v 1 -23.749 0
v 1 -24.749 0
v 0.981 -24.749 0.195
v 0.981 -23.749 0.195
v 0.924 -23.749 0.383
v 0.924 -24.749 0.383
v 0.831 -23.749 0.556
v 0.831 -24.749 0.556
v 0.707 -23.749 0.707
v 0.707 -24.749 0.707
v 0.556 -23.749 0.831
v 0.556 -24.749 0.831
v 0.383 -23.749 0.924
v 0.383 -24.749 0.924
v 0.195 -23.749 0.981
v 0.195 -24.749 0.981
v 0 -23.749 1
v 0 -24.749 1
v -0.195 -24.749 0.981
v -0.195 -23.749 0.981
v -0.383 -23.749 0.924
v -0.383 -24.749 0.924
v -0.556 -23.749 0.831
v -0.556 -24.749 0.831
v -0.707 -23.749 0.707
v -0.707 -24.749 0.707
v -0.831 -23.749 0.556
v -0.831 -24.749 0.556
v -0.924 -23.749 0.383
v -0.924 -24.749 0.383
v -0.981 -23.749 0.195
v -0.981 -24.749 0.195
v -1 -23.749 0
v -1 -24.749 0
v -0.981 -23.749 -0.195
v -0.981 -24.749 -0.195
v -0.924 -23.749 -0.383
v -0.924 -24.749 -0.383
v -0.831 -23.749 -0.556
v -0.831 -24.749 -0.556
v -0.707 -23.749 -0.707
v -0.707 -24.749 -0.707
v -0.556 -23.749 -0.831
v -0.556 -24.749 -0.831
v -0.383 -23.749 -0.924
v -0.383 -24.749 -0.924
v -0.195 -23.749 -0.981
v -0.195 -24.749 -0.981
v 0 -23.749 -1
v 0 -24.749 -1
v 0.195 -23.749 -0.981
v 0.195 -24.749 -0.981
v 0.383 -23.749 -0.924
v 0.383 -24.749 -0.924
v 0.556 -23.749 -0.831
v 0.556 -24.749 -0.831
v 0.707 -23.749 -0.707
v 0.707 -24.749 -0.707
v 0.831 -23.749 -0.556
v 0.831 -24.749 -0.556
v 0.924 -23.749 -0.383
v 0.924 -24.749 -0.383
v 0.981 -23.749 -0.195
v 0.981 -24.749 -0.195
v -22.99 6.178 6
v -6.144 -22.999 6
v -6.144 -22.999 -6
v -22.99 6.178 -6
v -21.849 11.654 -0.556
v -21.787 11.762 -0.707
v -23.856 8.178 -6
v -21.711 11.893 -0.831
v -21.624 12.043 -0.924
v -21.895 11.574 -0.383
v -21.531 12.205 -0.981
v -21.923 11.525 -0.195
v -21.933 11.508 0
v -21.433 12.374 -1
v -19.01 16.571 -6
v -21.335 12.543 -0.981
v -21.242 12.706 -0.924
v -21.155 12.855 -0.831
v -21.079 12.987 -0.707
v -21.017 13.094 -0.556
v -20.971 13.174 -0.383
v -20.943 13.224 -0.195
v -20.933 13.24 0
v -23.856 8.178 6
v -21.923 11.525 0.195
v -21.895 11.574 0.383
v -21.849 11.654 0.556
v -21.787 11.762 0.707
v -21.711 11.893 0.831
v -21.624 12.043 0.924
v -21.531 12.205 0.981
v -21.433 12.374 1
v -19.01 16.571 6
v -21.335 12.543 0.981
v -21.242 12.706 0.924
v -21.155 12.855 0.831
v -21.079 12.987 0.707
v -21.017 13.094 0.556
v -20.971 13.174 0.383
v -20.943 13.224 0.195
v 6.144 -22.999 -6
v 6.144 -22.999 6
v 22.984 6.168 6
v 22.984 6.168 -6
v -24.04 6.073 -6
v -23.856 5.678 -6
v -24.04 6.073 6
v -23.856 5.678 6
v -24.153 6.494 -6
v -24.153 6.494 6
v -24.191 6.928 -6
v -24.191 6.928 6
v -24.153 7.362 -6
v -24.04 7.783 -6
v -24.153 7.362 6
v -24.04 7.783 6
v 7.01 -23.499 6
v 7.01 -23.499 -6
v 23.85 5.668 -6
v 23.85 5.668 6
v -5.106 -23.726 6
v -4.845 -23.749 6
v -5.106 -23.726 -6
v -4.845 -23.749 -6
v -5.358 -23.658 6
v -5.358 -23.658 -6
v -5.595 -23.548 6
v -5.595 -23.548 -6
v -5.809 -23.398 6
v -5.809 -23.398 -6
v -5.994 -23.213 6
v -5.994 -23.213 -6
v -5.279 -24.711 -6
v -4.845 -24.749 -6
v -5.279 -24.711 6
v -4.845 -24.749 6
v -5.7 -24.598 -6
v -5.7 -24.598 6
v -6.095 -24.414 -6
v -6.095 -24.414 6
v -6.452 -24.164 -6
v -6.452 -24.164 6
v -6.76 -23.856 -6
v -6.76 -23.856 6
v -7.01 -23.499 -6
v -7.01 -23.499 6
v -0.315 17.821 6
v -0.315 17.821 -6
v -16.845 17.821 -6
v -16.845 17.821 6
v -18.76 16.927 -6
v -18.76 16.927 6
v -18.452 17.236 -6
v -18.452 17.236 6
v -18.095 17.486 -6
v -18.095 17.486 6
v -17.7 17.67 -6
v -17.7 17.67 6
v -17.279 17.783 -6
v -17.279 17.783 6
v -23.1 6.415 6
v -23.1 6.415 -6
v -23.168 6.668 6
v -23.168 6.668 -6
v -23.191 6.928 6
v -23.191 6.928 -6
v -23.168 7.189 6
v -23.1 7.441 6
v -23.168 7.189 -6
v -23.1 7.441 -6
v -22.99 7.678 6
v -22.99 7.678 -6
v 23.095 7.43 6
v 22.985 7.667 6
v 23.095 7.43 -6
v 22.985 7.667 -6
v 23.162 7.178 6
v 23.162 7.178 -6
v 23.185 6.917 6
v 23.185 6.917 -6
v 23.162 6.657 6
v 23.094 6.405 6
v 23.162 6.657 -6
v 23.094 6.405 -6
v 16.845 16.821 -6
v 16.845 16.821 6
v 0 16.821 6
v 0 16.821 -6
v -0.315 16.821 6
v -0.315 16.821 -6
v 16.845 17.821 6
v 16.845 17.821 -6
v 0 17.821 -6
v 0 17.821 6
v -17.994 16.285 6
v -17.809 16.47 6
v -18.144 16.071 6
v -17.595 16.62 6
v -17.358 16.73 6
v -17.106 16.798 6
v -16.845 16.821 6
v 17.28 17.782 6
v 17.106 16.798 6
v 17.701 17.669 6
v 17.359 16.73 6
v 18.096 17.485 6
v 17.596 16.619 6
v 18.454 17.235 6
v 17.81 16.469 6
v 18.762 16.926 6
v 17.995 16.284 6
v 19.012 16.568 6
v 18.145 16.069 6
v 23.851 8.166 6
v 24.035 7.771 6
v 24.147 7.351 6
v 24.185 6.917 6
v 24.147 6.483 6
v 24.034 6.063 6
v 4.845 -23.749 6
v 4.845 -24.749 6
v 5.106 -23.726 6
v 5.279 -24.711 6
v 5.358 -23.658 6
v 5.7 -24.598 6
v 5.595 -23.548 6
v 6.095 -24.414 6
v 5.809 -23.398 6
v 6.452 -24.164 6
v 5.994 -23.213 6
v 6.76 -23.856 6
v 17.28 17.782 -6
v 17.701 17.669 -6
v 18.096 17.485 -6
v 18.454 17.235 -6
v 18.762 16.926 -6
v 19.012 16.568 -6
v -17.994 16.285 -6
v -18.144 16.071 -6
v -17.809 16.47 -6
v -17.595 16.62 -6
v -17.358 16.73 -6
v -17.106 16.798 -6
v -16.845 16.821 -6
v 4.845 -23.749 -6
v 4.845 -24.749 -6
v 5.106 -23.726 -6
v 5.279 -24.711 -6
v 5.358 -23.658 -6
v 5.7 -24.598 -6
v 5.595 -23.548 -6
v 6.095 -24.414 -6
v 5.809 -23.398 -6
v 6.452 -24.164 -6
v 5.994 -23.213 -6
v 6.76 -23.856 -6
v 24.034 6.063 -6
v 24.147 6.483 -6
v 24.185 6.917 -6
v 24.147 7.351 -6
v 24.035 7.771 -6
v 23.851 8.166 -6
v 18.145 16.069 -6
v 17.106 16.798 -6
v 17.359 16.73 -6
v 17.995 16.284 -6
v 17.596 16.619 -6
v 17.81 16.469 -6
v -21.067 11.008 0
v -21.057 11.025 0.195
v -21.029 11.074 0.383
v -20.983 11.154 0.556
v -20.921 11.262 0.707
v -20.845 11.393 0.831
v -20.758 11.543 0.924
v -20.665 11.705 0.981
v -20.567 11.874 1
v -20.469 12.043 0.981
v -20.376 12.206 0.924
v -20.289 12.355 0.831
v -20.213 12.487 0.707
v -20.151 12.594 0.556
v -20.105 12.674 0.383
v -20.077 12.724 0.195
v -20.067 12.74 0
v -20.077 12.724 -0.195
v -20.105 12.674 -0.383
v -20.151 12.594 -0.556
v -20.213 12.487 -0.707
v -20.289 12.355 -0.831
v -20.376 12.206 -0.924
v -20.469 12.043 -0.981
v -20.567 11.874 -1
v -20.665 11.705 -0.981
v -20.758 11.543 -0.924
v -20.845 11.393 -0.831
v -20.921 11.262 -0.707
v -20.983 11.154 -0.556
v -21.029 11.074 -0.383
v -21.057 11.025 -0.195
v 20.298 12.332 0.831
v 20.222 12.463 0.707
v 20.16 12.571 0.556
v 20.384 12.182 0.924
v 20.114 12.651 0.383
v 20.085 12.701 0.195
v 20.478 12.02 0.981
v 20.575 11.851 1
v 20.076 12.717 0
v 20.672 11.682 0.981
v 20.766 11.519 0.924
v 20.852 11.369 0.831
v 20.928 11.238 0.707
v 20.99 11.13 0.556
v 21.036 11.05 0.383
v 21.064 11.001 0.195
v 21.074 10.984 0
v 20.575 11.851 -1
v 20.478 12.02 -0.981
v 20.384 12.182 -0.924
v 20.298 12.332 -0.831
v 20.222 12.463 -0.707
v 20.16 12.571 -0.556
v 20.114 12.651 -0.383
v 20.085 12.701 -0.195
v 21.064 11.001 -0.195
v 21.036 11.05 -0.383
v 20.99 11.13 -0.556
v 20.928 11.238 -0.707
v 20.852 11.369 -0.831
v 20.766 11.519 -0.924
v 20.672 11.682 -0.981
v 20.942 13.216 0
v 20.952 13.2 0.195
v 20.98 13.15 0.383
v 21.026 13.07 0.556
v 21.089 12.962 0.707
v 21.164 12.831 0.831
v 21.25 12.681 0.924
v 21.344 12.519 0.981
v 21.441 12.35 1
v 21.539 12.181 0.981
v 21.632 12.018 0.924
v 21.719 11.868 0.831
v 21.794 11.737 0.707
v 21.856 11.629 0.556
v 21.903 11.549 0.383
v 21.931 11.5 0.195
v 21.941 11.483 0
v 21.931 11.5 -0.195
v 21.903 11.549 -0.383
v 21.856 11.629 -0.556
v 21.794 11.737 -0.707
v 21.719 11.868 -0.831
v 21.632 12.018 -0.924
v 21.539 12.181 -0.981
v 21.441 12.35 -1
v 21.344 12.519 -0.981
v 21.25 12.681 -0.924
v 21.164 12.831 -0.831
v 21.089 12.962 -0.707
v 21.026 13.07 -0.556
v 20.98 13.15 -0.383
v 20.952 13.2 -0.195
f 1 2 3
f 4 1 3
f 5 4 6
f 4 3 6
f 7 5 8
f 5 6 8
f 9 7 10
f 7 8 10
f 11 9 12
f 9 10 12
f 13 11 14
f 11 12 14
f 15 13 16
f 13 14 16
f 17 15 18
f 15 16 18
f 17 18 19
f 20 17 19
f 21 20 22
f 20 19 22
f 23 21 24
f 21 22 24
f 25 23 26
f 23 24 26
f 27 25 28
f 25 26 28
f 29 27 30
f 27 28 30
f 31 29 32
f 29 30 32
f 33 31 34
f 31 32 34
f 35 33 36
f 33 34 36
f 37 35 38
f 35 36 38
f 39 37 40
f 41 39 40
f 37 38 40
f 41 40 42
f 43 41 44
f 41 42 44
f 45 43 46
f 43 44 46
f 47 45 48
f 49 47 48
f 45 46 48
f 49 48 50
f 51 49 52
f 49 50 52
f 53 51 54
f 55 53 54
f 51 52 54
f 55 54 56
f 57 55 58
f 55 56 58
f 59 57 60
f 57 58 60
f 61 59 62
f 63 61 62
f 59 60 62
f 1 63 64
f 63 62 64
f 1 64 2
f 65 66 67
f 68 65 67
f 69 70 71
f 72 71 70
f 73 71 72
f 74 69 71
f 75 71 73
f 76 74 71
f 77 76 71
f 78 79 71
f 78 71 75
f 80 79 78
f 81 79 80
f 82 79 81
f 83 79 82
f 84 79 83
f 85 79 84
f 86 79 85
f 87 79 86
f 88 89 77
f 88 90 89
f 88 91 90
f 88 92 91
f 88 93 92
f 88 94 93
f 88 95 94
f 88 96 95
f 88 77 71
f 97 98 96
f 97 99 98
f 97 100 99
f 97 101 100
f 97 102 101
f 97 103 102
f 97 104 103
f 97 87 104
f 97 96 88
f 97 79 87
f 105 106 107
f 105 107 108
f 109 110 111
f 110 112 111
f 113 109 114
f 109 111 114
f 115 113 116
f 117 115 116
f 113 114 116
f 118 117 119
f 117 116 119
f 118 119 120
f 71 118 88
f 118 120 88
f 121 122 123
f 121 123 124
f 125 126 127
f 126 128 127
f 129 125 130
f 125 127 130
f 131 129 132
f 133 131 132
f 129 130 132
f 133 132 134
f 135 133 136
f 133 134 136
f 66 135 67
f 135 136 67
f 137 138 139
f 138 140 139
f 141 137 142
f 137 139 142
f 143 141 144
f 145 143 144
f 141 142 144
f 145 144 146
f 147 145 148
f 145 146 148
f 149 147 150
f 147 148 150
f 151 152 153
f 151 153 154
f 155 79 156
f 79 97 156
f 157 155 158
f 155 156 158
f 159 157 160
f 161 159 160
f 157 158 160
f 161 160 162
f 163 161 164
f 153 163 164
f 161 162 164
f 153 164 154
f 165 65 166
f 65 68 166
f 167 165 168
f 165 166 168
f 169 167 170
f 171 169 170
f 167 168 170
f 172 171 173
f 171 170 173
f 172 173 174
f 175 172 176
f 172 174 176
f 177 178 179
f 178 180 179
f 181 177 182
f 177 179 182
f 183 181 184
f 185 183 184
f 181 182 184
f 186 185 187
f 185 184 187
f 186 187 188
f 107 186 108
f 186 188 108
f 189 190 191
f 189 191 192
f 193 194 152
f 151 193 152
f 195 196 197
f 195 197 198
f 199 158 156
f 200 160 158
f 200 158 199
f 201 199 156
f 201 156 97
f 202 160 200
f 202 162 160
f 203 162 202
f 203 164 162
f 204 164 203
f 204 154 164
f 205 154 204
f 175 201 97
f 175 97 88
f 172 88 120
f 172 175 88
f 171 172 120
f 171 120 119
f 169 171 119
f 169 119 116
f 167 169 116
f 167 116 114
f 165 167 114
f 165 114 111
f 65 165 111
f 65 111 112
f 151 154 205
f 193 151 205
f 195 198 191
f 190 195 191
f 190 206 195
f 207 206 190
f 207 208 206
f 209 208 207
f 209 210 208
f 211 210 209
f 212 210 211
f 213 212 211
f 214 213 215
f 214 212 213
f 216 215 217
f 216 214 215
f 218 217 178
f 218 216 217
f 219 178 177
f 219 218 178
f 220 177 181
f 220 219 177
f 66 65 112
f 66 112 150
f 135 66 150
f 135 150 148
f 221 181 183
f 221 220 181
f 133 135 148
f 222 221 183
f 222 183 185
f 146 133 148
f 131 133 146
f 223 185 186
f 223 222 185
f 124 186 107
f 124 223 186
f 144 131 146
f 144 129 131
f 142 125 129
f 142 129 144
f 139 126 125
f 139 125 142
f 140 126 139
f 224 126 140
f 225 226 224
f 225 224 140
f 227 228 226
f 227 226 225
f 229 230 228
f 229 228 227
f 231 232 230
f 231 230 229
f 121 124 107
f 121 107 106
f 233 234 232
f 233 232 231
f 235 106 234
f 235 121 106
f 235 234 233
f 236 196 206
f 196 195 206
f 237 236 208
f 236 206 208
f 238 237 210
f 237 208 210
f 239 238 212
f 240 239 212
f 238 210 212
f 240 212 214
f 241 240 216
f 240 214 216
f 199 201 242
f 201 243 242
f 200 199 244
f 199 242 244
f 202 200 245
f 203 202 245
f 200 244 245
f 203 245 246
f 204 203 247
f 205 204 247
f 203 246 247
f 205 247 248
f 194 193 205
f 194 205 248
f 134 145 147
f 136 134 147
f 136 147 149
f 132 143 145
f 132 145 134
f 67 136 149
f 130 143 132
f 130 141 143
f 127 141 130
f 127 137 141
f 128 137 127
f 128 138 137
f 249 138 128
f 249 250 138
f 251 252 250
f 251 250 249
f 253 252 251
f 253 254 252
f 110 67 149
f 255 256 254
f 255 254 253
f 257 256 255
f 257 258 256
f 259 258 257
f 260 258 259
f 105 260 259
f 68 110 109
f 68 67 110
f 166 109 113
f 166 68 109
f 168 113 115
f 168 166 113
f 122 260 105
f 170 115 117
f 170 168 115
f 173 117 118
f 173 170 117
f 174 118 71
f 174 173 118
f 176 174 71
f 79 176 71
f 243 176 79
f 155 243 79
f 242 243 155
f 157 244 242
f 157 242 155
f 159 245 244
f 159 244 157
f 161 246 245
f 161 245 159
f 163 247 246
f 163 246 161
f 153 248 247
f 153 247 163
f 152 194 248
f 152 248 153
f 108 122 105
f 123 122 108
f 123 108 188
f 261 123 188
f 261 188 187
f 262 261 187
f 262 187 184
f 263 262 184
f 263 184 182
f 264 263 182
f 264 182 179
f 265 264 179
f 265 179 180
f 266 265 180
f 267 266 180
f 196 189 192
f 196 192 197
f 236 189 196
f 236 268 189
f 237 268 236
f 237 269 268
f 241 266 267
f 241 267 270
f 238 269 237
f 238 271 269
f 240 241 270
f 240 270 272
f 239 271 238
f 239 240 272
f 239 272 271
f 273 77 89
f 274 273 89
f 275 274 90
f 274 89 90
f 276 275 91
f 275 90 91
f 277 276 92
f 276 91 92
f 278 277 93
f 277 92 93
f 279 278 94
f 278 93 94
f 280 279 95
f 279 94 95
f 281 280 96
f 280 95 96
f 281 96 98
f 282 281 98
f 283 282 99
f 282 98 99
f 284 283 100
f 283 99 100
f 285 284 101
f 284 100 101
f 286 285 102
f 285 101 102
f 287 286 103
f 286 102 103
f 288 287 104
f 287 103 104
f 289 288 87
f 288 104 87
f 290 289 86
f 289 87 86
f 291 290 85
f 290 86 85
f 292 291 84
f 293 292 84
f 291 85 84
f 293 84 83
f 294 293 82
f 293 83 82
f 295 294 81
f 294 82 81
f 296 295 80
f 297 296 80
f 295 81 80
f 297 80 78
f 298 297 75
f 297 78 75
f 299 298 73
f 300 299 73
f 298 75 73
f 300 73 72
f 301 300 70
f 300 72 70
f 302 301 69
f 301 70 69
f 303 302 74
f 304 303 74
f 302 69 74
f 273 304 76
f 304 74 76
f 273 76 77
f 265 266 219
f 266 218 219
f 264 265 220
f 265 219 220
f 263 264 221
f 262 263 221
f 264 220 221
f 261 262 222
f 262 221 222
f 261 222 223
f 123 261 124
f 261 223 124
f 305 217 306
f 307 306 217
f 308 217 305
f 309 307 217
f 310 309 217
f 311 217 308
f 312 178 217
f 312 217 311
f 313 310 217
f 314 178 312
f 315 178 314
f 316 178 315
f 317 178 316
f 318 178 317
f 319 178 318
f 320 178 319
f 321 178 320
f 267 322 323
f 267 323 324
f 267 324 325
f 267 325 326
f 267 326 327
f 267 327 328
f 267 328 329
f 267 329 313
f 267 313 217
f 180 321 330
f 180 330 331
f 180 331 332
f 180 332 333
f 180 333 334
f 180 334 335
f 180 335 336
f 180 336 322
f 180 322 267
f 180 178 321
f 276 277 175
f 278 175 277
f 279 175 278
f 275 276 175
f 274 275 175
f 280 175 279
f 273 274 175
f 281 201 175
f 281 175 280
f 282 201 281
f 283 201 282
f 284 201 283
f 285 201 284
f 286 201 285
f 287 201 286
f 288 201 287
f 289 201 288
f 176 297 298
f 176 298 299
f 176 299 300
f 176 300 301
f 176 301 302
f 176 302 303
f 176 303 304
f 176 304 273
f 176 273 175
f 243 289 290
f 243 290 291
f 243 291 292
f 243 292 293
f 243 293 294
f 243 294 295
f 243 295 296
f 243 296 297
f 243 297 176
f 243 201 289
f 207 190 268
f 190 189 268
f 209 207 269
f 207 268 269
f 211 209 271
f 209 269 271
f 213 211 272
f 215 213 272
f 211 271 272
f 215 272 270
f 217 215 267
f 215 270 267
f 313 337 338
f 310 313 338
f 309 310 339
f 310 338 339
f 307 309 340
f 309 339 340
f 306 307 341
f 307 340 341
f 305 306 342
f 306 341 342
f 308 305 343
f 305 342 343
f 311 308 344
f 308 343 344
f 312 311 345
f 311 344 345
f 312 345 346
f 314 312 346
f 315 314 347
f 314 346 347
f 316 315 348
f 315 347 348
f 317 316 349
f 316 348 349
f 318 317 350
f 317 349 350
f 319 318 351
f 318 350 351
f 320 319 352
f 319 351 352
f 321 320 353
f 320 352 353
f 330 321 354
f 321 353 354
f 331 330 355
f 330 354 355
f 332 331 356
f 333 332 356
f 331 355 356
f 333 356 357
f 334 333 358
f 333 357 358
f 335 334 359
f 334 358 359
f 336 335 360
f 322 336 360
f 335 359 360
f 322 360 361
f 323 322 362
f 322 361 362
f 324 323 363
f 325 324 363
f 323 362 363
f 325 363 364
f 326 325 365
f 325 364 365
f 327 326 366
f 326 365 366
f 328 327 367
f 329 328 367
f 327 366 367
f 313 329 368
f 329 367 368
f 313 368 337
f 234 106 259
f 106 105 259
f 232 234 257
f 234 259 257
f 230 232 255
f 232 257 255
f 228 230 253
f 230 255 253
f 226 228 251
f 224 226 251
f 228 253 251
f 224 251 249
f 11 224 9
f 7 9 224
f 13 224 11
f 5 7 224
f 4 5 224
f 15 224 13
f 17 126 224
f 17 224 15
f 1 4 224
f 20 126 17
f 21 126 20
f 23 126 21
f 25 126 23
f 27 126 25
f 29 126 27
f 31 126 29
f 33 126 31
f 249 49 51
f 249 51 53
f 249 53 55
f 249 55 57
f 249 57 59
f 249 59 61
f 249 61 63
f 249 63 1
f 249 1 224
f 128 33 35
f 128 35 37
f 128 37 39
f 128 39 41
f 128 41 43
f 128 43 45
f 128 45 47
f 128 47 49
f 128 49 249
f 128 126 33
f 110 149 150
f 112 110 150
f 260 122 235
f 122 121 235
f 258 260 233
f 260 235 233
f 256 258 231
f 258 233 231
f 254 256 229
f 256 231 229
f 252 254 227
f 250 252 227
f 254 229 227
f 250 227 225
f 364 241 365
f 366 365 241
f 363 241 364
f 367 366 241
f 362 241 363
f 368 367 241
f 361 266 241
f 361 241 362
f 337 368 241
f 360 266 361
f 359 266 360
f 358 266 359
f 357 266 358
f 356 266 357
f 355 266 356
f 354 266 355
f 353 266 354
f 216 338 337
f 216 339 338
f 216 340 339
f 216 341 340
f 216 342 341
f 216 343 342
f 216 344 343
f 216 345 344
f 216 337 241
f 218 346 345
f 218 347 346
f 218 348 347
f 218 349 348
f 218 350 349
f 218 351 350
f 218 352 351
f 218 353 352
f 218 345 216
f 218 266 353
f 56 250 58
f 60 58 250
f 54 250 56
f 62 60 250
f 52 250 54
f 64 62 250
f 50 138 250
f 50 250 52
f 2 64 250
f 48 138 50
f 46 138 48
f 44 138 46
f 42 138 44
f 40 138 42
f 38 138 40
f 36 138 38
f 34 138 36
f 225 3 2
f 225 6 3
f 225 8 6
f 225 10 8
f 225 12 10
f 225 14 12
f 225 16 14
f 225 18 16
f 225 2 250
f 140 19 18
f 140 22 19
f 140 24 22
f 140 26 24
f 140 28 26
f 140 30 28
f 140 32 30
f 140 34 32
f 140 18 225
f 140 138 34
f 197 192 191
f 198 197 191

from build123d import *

# Parameters (mm, degrees)
F1_W     = 1
F1_H     = 12
F3_R     = 1
F4_DEPTH = 1
F5_R     = 1
F6_DEPTH = 1
F7_R     = 1
F8_DEPTH = 1


with BuildPart() as f2:
    # F2: sweep along a path in F0
    with BuildLine(Plane.XY) as f2_path:
        Line((0, 17.3205080757), (0.268994947, 17.3205080757))
        Line((0.268994947, 17.3205080757), (16.8452994616, 17.3205080757))
        ThreePointArc((16.8452994616, 17.3205080757), (17.8461933486, 17.0520424897), (18.5783816717, 16.3187195027))
        Line((18.5783816717, 16.3187195027), (23.4179019593, 7.9164048343))
        ThreePointArc((23.4179019593, 7.9164048343), (23.6848194828, 6.9171610817), (23.4168705568, 5.9181934072))
        Line((23.4168705568, 5.9181934072), (6.5773502692, -23.248711306))
        ThreePointArc((6.5773502692, -23.248711306), (5.8452994616, -23.9807621135), (4.8452994616, -24.248711306))
        Line((4.8452994616, -24.248711306), (-4.8452994616, -24.248711306))
        ThreePointArc((-4.8452994616, -24.248711306), (-5.8452994616, -23.9807621135), (-6.5773502692, -23.248711306))
        Line((-6.5773502692, -23.248711306), (-23.4226497308, 5.9282032303))
        ThreePointArc((-23.4226497308, 5.9282032303), (-23.6905989232, 6.9282032303), (-23.4226497308, 7.9282032303))
        Line((-23.4226497308, 7.9282032303), (-18.5773502692, 16.3205080757))
        ThreePointArc((-18.5773502692, 16.3205080757), (-17.8452994616, 17.0525588833), (-16.8452994616, 17.3205080757))
        Line((-16.8452994616, 17.3205080757), (-0.3151426208, 17.3205080757))
    # F1 (on Right) → F2 (sweep)
    with BuildSketch(Plane.YZ):
        with Locations((17.3205080757, 0)):
            Rectangle(F1_W, F1_H)
    sweep(path=f2_path.line)

    # F3 (on face) → F4 (cut, through all)
    with BuildSketch(Plane.XZ.offset(24.748711306)):
        Circle(F3_R)
    extrude(amount=-F4_DEPTH, mode=Mode.SUBTRACT)

    # F5 (on face) → F6 (cut, through all)
    with BuildSketch(Plane(origin=(21.441430996, 12.3497208085, 0), x_dir=(-0.4991057135, 0.866541105, 0), z_dir=(0.866541105, 0.4991057135, 0))):
        Circle(F5_R)
    extrude(amount=-F6_DEPTH, mode=Mode.SUBTRACT)

    # F7 (on face) → F8 (cut, through all)
    with BuildSketch(Plane(origin=(-21.4330127019, 12.374355653, 0), x_dir=(-0.5, -0.8660254038, 0), z_dir=(-0.8660254038, 0.5, 0))):
        Circle(F7_R)
    extrude(amount=-F8_DEPTH, mode=Mode.SUBTRACT)


solid = f2.part
